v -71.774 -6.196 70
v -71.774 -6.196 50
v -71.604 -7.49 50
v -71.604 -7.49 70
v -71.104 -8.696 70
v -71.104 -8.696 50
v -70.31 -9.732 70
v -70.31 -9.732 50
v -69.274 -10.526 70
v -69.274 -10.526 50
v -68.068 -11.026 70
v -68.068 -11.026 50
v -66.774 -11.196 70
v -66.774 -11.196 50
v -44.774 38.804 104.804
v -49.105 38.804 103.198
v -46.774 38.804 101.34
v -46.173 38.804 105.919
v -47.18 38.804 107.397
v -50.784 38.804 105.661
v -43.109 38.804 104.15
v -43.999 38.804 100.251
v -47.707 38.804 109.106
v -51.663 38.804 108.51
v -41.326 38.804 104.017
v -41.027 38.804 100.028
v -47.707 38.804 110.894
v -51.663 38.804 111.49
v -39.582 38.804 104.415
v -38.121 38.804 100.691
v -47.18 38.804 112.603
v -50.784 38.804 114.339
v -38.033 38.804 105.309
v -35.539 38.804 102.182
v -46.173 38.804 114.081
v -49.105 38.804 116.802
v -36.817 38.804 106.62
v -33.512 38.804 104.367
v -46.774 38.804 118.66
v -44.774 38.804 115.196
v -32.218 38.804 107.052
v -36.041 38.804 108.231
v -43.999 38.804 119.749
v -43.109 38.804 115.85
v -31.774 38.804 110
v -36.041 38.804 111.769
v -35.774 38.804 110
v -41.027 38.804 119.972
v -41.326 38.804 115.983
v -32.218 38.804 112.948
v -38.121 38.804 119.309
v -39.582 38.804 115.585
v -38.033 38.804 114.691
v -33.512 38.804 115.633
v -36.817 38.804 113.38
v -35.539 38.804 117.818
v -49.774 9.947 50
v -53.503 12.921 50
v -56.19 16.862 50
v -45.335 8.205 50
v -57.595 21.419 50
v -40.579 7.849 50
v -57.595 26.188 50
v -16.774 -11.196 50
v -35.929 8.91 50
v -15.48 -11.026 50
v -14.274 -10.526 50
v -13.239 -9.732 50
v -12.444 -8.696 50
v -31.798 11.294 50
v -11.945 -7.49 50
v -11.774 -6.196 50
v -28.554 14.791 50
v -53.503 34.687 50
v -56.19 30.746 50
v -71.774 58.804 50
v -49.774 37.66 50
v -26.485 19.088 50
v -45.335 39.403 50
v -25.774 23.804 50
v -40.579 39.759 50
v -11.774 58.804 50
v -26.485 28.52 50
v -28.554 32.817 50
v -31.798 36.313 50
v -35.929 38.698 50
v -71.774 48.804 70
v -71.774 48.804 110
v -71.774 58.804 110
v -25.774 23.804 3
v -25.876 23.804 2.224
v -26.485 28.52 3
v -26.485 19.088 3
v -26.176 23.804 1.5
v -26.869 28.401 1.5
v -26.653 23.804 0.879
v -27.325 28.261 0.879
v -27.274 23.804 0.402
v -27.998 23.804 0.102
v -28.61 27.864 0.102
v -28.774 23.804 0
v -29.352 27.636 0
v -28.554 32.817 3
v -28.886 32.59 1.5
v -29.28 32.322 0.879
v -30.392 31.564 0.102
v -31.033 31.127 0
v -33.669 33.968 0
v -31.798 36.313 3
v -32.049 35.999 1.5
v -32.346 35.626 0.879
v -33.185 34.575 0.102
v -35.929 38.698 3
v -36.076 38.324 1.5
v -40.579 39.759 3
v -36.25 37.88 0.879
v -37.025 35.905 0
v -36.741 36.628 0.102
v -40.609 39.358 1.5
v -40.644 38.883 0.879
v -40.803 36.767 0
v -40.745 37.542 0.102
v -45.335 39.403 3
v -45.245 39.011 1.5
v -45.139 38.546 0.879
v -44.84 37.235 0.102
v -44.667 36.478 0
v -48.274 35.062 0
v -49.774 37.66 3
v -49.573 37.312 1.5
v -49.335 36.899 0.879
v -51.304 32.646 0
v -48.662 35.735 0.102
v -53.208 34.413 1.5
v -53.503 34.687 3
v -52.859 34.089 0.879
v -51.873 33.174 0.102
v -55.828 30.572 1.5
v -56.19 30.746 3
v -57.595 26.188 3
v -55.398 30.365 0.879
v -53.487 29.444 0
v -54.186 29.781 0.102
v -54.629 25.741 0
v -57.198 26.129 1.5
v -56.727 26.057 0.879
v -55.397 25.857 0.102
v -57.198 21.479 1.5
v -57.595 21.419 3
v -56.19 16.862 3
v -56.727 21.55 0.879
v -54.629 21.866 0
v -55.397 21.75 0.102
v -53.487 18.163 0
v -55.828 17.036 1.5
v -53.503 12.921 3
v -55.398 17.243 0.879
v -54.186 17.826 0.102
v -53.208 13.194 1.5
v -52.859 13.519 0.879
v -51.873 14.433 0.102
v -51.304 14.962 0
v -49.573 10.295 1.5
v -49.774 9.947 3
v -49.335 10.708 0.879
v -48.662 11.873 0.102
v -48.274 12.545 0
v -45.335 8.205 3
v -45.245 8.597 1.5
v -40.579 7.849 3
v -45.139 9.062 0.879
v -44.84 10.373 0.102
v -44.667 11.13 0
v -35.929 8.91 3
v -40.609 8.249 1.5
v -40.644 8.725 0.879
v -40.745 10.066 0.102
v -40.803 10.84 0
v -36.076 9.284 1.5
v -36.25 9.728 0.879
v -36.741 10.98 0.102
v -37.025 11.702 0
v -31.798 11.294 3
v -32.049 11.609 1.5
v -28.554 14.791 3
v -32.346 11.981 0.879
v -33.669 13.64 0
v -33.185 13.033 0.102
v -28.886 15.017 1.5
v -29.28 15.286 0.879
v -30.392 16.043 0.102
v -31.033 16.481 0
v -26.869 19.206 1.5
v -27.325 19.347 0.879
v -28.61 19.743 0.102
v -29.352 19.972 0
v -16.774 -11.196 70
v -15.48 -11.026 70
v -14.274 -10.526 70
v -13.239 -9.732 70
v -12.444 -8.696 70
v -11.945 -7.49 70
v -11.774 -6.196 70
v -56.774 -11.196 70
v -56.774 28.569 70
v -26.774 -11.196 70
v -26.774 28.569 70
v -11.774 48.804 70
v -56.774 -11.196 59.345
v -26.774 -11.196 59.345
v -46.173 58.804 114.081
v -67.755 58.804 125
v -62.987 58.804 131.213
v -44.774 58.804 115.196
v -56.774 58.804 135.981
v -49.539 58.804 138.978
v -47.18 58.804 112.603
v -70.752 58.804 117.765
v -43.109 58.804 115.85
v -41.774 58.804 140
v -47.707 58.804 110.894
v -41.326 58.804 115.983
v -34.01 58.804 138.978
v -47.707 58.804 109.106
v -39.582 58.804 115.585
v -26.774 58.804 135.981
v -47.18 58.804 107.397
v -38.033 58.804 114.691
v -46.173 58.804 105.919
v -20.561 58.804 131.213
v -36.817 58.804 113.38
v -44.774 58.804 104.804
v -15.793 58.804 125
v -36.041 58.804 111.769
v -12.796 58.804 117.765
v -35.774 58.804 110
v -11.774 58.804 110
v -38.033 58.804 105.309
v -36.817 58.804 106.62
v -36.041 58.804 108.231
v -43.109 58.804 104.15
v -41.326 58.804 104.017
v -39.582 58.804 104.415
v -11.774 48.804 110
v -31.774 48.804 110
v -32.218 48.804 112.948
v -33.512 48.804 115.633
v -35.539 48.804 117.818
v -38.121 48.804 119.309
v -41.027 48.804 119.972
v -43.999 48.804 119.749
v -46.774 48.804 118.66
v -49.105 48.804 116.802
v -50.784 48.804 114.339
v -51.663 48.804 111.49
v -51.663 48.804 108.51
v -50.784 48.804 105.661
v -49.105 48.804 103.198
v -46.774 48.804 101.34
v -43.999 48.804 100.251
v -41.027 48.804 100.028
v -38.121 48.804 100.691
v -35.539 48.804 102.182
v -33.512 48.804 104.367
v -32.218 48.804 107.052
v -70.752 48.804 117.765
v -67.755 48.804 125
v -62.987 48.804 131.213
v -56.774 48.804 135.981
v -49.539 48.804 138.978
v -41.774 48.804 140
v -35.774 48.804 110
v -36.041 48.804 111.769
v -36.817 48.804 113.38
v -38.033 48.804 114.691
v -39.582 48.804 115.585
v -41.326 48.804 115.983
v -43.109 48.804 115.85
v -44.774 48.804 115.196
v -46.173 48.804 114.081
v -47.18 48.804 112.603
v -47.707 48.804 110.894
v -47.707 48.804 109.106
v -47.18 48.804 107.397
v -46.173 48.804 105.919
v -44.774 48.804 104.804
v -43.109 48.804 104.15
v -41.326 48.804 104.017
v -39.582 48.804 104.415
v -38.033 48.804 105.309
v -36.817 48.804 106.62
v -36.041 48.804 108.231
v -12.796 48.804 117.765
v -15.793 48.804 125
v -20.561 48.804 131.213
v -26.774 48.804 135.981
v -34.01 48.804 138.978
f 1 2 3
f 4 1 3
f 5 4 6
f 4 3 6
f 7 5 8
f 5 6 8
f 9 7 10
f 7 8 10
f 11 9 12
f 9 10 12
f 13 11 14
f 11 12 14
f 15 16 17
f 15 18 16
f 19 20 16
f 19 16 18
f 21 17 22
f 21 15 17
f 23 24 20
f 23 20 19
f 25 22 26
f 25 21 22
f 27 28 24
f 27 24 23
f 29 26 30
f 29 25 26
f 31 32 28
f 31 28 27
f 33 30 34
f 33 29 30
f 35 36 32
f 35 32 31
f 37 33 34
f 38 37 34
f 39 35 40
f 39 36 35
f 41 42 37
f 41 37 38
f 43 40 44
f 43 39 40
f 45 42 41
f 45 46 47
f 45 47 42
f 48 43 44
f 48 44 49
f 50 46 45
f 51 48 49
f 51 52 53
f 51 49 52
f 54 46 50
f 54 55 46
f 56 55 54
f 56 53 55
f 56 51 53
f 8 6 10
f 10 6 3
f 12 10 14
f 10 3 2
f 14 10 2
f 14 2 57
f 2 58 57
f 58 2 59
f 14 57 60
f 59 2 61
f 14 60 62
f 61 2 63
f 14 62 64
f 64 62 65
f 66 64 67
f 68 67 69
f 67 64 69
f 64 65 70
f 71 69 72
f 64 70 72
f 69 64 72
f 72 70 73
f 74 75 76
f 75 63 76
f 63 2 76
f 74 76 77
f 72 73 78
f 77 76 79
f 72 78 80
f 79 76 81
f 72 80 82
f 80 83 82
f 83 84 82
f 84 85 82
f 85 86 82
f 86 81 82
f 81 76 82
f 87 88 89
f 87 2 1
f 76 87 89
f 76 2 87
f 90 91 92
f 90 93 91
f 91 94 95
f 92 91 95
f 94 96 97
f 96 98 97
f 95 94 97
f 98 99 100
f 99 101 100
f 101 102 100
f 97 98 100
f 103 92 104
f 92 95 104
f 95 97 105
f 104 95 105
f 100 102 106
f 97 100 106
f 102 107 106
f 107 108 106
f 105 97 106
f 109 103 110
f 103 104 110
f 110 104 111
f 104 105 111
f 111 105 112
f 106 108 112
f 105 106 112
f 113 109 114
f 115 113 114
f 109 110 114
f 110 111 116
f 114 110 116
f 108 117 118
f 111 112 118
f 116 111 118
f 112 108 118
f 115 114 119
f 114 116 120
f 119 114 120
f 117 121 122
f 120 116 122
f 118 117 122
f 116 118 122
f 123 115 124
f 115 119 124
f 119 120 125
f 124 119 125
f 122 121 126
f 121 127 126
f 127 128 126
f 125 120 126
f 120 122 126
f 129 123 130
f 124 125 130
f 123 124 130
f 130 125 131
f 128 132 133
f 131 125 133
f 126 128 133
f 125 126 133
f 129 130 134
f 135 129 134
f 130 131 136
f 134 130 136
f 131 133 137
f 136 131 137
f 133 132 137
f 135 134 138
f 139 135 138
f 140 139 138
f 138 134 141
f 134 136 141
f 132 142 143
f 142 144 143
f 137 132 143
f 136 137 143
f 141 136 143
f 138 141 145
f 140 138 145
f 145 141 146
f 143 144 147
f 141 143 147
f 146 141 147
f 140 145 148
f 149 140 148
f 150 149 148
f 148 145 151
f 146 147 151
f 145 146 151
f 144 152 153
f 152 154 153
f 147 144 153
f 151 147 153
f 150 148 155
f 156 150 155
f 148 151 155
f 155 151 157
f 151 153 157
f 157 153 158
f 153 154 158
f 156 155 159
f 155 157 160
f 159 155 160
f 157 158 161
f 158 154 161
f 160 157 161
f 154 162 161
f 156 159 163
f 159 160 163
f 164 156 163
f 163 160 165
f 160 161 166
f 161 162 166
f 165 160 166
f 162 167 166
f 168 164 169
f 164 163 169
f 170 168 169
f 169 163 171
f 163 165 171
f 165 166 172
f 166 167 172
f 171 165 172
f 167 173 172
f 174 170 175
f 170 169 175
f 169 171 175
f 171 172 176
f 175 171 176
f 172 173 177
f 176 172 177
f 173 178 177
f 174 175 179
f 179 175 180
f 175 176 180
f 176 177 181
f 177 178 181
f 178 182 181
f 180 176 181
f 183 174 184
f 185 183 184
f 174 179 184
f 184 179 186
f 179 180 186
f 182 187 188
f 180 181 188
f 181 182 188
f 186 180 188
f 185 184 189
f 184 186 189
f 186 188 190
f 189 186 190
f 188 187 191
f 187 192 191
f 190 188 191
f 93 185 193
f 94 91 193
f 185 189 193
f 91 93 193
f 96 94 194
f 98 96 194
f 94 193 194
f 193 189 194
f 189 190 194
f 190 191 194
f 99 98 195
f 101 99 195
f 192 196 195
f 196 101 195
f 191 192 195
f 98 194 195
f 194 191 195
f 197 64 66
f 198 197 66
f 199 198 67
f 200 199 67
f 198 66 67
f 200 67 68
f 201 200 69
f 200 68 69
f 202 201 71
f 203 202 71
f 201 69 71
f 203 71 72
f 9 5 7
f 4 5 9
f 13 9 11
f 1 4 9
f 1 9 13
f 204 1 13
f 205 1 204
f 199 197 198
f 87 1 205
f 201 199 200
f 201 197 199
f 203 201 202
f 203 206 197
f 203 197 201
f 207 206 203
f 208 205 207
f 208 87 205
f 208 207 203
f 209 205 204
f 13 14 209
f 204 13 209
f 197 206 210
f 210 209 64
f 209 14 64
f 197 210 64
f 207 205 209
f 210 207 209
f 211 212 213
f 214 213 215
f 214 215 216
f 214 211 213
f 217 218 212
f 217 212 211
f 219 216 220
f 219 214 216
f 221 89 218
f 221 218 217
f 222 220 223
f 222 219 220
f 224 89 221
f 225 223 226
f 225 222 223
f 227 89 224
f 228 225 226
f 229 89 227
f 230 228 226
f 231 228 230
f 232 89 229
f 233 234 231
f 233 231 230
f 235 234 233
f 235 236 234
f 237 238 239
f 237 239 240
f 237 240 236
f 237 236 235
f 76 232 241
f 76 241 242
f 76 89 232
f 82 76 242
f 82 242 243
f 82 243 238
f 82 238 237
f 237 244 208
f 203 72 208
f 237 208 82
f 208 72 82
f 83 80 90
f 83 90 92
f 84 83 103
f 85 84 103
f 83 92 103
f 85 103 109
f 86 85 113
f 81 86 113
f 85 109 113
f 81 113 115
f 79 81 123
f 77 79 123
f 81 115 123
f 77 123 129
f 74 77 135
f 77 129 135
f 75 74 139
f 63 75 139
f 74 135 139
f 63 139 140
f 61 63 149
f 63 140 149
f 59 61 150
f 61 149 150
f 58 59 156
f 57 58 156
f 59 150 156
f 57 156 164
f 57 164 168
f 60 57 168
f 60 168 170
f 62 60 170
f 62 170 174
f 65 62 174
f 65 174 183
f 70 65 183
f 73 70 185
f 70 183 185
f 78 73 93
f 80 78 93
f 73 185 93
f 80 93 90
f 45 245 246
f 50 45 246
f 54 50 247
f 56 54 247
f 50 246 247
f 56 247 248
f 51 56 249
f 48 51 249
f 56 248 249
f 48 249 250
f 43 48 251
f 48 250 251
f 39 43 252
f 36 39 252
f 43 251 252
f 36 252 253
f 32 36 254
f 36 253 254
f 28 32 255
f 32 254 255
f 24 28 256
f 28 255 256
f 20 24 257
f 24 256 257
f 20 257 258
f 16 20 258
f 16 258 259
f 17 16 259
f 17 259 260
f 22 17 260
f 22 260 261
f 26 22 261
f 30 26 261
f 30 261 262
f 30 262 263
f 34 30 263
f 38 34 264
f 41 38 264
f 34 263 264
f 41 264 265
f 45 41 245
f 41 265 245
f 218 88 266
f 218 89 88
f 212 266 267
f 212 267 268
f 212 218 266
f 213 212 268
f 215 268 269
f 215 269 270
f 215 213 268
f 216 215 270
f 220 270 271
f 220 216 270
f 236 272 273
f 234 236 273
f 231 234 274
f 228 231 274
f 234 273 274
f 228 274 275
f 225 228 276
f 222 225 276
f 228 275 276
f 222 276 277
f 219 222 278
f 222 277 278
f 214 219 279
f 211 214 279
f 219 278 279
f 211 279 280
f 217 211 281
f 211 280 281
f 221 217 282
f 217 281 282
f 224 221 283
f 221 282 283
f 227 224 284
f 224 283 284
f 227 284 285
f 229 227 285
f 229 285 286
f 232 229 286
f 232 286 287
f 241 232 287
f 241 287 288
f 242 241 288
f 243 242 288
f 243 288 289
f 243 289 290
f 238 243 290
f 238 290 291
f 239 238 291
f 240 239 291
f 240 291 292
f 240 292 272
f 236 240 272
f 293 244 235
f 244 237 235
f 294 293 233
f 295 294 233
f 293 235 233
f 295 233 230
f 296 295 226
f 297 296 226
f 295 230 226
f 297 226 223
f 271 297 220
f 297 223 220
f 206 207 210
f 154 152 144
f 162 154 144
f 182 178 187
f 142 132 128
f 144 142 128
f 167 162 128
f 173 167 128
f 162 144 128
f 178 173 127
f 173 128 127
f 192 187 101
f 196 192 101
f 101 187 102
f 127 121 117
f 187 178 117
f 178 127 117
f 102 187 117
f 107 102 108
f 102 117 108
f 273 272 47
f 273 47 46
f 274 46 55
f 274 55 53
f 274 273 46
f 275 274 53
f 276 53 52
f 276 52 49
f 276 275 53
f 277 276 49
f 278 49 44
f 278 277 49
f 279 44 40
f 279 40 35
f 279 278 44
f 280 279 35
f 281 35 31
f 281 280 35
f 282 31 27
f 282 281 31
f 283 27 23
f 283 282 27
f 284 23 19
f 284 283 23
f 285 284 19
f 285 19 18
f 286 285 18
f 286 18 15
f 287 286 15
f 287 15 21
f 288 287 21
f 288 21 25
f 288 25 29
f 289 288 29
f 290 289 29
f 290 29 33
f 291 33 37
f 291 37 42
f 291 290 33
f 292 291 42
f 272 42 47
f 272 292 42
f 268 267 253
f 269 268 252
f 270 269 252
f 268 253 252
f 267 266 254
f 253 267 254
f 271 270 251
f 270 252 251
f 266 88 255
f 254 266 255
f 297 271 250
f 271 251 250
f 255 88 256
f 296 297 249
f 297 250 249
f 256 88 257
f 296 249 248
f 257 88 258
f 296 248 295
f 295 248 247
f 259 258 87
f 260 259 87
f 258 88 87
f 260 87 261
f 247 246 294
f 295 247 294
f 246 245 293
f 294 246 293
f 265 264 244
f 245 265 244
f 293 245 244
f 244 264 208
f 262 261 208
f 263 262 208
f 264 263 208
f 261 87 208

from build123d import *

# Parameters (mm, degrees)
F0_R      = 16
F1_DEPTH  = 50
F2_R      = 3
F3_R      = 16
F4_DEPTH  = 20
F7_DEPTH  = 15
F8_W      = 60
F8_H      = 10
F9_DEPTH  = 70
F10_R     = 29.99999
F11_R     = 10
F11_R_2   = 6
F12_DEPTH = 10
F13_DEPTH = 10.001


# Not quite as in the source:
# - a fillet or chamfer is up to 0.001 mm smaller than in the source, because OpenCascade refuses the exact size


with BuildPart() as f1:
    # F0 (on Top) → F1 (new body)
    with BuildSketch(Plane.XY):
        with Locations((-41.7741946876, 23.8037649542)):
            Circle(F0_R)
    extrude(amount=F1_DEPTH)

    # F2
    f2_edges = [f1.edges().sort_by_distance(p)[0] for p in [
        (-57.774195, 23.803765, 0),
    ]]
    fillet(f2_edges, radius=F2_R)

    # F3 (on face) → F4 (join)
    with BuildSketch(Plane.XY.offset(50)):
        with BuildLine():
            Line((-11.7741946876, 58.8037649542), (-41.7741946876, 58.8037649542))
            Line((-41.7741946876, 58.8037649542), (-71.7741946876, 58.8037649542))
            Line((-71.7741946876, 58.8037649542), (-71.7741946876, 23.8037649542))
            Line((-71.7741946876, 23.8037649542), (-71.7741946876, -6.1962350458))
            ThreePointArc((-71.7741946876, -6.1962350458), (-70.3097285935, -9.7317689517), (-66.7741946876, -11.1962350458))
            Line((-66.7741946876, -11.1962350458), (-56.7741946876, -11.1962350458))
            Line((-56.7741946876, -11.1962350458), (-41.7741946876, -11.1962350458))
            Line((-41.7741946876, -11.1962350458), (-26.7741946876, -11.1962350458))
            Line((-26.7741946876, -11.1962350458), (-16.7741946876, -11.1962350458))
            ThreePointArc((-16.7741946876, -11.1962350458), (-13.2386607817, -9.7317689517), (-11.7741946876, -6.1962350458))
            Line((-11.7741946876, -6.1962350458), (-11.7741946876, 58.8037649542))
        make_face()
        with Locations((-41.7741946876, 23.8037649542)):
            Circle(F3_R, mode=Mode.SUBTRACT)
        with Locations((-41.7741946876, 23.8037649542)):
            Circle(F3_R)
    extrude(amount=F4_DEPTH)

    # F6 (on offset) → F7 (cut, symmetric)
    with BuildSketch(Plane(origin=(-41.7741946876, 0, 0), x_dir=(0, -1, 0), z_dir=(-1, 0, 0))):
        Polygon((11.2580982968, 59.3282932557), (11.2580982968, 70.0462609529), (-28.7419017032, 70.0462609529), align=None)
    extrude(amount=F7_DEPTH, both=True, mode=Mode.SUBTRACT)

    # F8 (on face) → F9 (join)
    with BuildSketch(Plane.XY.offset(70)):
        with Locations((-41.7741946876, 53.8037649542)):
            Rectangle(F8_W, F8_H)
    extrude(amount=F9_DEPTH)

    # F10 (radius 30 in the source; OpenCascade refuses exactly that, so slightly less here)
    f10_edges = [f1.edges().sort_by_distance(p)[0] for p in [
        (-71.774195, 53.803765, 140),
        (-11.774195, 53.803765, 140),
    ]]
    fillet(f10_edges, radius=F10_R)

    # F11 (on face) → F12 (join)
    with BuildSketch(Plane.XZ.offset(-48.8037649542)):
        with Locations((-41.7741946876, 110)):
            Circle(F11_R)
        with Locations((-41.7741946876, 110)):
            Circle(F11_R_2, mode=Mode.SUBTRACT)
    extrude(amount=F12_DEPTH)

    # F13 (cut, through all): a face of the model
    f13_faces = [f1.faces().sort_by_distance(p)[0] for p in [
        (-41.7741946876, 48.8037649542, 110),
    ]]
    extrude(f13_faces, amount=-F13_DEPTH, mode=Mode.SUBTRACT)


solid = f1.part
